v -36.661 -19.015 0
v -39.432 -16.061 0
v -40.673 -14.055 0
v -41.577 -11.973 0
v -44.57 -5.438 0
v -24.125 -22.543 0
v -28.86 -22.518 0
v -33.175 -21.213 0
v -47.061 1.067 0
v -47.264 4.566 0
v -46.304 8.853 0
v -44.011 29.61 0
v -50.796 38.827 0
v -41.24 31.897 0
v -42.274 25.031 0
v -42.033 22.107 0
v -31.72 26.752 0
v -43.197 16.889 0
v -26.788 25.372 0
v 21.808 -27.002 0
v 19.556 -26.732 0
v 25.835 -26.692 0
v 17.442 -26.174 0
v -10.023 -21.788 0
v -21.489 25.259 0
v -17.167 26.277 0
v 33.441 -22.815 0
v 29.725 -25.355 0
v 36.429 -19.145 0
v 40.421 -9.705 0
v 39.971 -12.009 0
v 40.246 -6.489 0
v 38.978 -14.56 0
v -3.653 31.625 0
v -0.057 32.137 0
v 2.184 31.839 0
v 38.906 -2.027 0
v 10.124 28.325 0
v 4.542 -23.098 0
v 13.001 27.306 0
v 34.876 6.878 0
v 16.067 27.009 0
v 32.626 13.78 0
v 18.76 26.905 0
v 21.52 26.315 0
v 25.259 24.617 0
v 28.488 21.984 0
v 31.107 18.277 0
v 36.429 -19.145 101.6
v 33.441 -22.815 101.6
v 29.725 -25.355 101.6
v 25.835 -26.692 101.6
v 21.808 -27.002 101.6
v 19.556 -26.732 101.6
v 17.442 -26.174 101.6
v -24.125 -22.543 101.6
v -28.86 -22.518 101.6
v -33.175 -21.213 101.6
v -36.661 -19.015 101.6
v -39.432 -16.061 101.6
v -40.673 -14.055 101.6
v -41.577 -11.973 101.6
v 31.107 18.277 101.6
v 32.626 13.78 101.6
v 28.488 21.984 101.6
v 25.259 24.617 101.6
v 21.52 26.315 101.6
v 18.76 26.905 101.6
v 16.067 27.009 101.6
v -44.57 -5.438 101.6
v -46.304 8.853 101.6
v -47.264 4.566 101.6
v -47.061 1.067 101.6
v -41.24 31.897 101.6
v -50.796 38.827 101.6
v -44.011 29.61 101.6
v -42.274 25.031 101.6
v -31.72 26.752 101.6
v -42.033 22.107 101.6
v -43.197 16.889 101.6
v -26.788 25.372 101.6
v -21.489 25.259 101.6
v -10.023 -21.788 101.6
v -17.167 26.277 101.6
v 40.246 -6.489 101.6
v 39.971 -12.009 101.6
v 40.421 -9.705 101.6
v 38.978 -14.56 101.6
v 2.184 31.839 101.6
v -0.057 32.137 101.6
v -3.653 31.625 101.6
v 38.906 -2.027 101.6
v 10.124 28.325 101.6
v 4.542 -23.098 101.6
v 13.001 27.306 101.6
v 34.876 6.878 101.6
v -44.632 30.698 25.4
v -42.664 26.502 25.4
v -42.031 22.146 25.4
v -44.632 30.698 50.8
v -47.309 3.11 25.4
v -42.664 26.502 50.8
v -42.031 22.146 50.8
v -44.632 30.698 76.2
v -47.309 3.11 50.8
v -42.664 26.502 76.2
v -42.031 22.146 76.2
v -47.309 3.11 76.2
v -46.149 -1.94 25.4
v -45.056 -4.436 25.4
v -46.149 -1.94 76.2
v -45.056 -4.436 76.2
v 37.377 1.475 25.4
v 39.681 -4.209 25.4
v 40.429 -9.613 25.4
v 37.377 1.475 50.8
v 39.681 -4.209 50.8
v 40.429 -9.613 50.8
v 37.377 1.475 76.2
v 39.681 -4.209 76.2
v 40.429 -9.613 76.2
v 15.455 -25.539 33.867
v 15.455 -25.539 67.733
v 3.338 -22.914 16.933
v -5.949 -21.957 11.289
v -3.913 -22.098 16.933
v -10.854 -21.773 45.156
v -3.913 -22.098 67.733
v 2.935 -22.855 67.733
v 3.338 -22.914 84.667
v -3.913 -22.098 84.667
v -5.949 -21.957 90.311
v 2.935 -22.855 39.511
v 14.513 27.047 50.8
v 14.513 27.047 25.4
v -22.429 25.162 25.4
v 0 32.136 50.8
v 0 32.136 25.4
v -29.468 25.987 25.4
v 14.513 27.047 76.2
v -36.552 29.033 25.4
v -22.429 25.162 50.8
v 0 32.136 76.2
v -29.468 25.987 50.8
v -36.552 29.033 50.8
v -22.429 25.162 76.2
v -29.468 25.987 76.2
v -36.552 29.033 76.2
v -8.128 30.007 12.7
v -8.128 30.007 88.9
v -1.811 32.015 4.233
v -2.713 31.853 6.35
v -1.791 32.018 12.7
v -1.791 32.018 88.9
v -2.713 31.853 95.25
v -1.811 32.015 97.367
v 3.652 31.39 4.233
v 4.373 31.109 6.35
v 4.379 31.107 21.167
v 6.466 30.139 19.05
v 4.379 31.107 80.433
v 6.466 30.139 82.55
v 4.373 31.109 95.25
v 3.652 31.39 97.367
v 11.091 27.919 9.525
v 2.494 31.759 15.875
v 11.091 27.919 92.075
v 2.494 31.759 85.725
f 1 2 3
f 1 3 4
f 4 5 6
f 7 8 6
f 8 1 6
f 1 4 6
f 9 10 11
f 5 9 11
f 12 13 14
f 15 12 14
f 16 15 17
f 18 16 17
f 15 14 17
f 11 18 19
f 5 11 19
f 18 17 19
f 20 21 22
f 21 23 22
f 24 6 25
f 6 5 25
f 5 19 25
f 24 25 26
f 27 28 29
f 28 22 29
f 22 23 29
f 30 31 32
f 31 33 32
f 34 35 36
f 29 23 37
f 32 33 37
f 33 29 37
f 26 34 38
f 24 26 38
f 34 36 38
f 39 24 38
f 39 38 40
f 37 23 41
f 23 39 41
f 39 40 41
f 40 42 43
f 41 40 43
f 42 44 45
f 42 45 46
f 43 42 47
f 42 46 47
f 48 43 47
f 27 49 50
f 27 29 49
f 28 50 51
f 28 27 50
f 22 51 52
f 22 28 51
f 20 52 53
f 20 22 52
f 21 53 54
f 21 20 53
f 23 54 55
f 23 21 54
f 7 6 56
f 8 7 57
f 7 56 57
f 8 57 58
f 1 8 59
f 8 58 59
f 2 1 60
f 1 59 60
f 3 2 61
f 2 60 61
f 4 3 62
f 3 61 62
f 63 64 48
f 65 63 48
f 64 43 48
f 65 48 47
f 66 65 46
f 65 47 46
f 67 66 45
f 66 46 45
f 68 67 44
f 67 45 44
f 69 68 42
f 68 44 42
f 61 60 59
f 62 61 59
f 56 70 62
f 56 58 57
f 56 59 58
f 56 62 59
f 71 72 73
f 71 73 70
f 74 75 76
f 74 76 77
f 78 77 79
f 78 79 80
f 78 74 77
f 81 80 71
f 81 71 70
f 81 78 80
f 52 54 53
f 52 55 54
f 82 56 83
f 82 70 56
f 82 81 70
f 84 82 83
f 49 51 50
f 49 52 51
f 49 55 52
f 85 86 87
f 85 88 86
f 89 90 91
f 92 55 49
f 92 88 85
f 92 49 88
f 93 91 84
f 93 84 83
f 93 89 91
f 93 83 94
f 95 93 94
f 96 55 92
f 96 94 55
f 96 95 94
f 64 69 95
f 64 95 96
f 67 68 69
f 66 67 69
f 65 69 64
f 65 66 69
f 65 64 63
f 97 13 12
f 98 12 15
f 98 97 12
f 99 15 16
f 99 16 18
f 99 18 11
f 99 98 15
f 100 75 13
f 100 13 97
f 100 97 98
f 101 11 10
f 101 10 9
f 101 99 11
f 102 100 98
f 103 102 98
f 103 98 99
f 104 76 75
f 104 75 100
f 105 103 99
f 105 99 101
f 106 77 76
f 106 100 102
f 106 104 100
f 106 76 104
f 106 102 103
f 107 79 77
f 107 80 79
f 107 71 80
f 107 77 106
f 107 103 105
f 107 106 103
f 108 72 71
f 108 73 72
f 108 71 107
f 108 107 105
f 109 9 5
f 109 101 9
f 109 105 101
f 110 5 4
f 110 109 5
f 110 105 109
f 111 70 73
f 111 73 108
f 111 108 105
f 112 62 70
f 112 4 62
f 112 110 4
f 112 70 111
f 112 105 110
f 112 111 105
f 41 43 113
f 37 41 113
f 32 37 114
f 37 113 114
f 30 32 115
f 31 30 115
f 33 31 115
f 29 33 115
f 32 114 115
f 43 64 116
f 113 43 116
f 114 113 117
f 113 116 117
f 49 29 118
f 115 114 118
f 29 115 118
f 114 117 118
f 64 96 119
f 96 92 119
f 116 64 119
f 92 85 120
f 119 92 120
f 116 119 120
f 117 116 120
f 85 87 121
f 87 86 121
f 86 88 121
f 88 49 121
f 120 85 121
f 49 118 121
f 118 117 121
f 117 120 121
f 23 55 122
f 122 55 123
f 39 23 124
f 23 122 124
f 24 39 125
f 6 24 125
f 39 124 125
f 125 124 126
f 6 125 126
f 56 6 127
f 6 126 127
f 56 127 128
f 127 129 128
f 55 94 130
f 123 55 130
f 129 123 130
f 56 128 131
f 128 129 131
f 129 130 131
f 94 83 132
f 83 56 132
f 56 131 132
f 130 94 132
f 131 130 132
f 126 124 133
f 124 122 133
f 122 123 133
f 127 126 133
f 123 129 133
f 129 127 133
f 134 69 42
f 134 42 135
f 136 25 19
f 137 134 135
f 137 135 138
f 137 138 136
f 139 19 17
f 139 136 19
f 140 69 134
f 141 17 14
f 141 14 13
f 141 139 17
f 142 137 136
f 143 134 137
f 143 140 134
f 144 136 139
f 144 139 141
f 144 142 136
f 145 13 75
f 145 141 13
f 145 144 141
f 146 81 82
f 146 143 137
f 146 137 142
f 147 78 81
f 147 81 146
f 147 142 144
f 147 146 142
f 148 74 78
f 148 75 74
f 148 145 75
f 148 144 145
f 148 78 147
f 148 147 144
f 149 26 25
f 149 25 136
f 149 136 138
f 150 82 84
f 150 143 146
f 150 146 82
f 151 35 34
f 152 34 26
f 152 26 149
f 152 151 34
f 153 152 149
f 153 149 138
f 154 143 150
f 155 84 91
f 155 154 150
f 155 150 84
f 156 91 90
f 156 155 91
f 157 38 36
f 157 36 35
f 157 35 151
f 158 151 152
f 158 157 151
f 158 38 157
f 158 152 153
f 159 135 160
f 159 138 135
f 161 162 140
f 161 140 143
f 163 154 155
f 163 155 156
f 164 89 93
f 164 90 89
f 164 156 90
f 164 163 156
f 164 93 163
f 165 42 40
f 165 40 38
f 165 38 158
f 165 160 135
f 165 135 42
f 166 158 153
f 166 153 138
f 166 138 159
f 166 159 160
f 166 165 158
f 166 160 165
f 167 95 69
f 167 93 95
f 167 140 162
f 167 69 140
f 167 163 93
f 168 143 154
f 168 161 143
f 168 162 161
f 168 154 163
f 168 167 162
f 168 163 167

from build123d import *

# Parameters (mm, degrees)
F0_W     = 101.5910282731
F0_H     = 77.6539891958
F1_DEPTH = 101.6
F3_DEPTH = 101.6
F5_DEPTH = 101.6
F7_DEPTH = 101.6
F9_DEPTH = 101.6
F10_R    = 16.0867356871


with BuildPart() as f1:
    # F0 (on Top) → F1 (new body)
    with BuildSketch(Plane.XY):
        Rectangle(F0_W, F0_H)
    extrude(amount=F1_DEPTH)

    # F2 (on face) → F3 (cut)
    with BuildSketch(Plane.XY.offset(101.6)):
        with BuildLine():
            Line((50.7955141366, 38.8269945979), (38.5442748666, 38.8269945979))
            add(Edge.make_bspline(
                [(38.5442748666, 38.8269945979), (34.7853659664, 30.2941058652), (27.4030797948, 13.5359911654), (46.6627614991, -9.3957882173), (29.103787605, -25.5658223286), (36.0228889451, -34.5663805962), (39.2981991172, -38.8269945979)],
                knots=[0, 0, 0, 0, 0.283682279, 0.5571360789, 0.7903605347, 1, 1, 1, 1], degree=3))
            Line((39.2981991172, -38.8269945979), (50.7955141366, -38.8269945979))
            Line((50.7955141366, -38.8269945979), (50.7955141366, 38.8269945979))
        make_face()
    extrude(amount=-F3_DEPTH, mode=Mode.SUBTRACT)

    # F4 (on face) → F5 (cut)
    with BuildSketch(Plane.XY.offset(101.6)):
        with BuildLine():
            add(Edge.make_bspline(
                [(38.5442748666, 38.8269945979), (29.9431561562, 32.6029015251), (14.8219290997, 21.6606127667), (0.0386577819, 37.5410923501), (-23.565421963, 18.2450760846), (-41.2868280887, 31.6398356211), (-50.7955141366, 38.8269945979)],
                knots=[0, 0, 0, 0, 0.2645834083, 0.4651517933, 0.7130191789, 1, 1, 1, 1], degree=3))
            Line((38.5442748666, 38.8269945979), (-50.7955141366, 38.8269945979))
        make_face()
    extrude(amount=-F5_DEPTH, mode=Mode.SUBTRACT)

    # F6 (on face) → F7 (cut)
    with BuildSketch(Plane.XY.offset(101.6)):
        with BuildLine():
            add(Edge.make_bspline(
                [(-50.7955141366, 38.8269945979), (-46.2906352529, 33.4547816389), (-37.173187337, 22.5819317548), (-52.7501205698, 2.7238951898), (-35.0519329818, -15.7962550208), (-45.3352097584, -30.839304446), (-50.7955141366, -38.8269945979)],
                knots=[0, 0, 0, 0, 0.2375830787, 0.4808456346, 0.7243348676, 1, 1, 1, 1], degree=3))
            Line((-50.7955141366, 38.8269945979), (-50.7955141366, -38.8269945979))
        make_face()
    extrude(amount=-F7_DEPTH, mode=Mode.SUBTRACT)

    # F8 (on face) → F9 (cut)
    with BuildSketch(Plane.XY.offset(101.6)):
        with BuildLine():
            Line((-50.7955141366, -38.8269945979), (39.2981991172, -38.8269945979))
            add(Edge.make_bspline(
                [(39.2981991172, -38.8269945979), (32.7183320176, -33.7923939712), (17.3722477055, -22.0503018399), (-35.0525291727, -19.4554191131), (-46.2426012078, -33.2246836844), (-50.7955141366, -38.8269945979)],
                knots=[0, 0, 0, 0, 0.3080537995, 0.7184673349, 1, 1, 1, 1], degree=3))
        make_face()
    extrude(amount=-F9_DEPTH, mode=Mode.SUBTRACT)

    # F10
    f10_edges = [f1.edges().sort_by_distance(p)[0] for p in [
        (-50.795514, -38.826995, 50.8),
        (39.298199, -38.826995, 50.8),
        (38.544275, 38.826995, 50.8),
    ]]
    fillet(f10_edges, radius=F10_R)


solid = f1.part
